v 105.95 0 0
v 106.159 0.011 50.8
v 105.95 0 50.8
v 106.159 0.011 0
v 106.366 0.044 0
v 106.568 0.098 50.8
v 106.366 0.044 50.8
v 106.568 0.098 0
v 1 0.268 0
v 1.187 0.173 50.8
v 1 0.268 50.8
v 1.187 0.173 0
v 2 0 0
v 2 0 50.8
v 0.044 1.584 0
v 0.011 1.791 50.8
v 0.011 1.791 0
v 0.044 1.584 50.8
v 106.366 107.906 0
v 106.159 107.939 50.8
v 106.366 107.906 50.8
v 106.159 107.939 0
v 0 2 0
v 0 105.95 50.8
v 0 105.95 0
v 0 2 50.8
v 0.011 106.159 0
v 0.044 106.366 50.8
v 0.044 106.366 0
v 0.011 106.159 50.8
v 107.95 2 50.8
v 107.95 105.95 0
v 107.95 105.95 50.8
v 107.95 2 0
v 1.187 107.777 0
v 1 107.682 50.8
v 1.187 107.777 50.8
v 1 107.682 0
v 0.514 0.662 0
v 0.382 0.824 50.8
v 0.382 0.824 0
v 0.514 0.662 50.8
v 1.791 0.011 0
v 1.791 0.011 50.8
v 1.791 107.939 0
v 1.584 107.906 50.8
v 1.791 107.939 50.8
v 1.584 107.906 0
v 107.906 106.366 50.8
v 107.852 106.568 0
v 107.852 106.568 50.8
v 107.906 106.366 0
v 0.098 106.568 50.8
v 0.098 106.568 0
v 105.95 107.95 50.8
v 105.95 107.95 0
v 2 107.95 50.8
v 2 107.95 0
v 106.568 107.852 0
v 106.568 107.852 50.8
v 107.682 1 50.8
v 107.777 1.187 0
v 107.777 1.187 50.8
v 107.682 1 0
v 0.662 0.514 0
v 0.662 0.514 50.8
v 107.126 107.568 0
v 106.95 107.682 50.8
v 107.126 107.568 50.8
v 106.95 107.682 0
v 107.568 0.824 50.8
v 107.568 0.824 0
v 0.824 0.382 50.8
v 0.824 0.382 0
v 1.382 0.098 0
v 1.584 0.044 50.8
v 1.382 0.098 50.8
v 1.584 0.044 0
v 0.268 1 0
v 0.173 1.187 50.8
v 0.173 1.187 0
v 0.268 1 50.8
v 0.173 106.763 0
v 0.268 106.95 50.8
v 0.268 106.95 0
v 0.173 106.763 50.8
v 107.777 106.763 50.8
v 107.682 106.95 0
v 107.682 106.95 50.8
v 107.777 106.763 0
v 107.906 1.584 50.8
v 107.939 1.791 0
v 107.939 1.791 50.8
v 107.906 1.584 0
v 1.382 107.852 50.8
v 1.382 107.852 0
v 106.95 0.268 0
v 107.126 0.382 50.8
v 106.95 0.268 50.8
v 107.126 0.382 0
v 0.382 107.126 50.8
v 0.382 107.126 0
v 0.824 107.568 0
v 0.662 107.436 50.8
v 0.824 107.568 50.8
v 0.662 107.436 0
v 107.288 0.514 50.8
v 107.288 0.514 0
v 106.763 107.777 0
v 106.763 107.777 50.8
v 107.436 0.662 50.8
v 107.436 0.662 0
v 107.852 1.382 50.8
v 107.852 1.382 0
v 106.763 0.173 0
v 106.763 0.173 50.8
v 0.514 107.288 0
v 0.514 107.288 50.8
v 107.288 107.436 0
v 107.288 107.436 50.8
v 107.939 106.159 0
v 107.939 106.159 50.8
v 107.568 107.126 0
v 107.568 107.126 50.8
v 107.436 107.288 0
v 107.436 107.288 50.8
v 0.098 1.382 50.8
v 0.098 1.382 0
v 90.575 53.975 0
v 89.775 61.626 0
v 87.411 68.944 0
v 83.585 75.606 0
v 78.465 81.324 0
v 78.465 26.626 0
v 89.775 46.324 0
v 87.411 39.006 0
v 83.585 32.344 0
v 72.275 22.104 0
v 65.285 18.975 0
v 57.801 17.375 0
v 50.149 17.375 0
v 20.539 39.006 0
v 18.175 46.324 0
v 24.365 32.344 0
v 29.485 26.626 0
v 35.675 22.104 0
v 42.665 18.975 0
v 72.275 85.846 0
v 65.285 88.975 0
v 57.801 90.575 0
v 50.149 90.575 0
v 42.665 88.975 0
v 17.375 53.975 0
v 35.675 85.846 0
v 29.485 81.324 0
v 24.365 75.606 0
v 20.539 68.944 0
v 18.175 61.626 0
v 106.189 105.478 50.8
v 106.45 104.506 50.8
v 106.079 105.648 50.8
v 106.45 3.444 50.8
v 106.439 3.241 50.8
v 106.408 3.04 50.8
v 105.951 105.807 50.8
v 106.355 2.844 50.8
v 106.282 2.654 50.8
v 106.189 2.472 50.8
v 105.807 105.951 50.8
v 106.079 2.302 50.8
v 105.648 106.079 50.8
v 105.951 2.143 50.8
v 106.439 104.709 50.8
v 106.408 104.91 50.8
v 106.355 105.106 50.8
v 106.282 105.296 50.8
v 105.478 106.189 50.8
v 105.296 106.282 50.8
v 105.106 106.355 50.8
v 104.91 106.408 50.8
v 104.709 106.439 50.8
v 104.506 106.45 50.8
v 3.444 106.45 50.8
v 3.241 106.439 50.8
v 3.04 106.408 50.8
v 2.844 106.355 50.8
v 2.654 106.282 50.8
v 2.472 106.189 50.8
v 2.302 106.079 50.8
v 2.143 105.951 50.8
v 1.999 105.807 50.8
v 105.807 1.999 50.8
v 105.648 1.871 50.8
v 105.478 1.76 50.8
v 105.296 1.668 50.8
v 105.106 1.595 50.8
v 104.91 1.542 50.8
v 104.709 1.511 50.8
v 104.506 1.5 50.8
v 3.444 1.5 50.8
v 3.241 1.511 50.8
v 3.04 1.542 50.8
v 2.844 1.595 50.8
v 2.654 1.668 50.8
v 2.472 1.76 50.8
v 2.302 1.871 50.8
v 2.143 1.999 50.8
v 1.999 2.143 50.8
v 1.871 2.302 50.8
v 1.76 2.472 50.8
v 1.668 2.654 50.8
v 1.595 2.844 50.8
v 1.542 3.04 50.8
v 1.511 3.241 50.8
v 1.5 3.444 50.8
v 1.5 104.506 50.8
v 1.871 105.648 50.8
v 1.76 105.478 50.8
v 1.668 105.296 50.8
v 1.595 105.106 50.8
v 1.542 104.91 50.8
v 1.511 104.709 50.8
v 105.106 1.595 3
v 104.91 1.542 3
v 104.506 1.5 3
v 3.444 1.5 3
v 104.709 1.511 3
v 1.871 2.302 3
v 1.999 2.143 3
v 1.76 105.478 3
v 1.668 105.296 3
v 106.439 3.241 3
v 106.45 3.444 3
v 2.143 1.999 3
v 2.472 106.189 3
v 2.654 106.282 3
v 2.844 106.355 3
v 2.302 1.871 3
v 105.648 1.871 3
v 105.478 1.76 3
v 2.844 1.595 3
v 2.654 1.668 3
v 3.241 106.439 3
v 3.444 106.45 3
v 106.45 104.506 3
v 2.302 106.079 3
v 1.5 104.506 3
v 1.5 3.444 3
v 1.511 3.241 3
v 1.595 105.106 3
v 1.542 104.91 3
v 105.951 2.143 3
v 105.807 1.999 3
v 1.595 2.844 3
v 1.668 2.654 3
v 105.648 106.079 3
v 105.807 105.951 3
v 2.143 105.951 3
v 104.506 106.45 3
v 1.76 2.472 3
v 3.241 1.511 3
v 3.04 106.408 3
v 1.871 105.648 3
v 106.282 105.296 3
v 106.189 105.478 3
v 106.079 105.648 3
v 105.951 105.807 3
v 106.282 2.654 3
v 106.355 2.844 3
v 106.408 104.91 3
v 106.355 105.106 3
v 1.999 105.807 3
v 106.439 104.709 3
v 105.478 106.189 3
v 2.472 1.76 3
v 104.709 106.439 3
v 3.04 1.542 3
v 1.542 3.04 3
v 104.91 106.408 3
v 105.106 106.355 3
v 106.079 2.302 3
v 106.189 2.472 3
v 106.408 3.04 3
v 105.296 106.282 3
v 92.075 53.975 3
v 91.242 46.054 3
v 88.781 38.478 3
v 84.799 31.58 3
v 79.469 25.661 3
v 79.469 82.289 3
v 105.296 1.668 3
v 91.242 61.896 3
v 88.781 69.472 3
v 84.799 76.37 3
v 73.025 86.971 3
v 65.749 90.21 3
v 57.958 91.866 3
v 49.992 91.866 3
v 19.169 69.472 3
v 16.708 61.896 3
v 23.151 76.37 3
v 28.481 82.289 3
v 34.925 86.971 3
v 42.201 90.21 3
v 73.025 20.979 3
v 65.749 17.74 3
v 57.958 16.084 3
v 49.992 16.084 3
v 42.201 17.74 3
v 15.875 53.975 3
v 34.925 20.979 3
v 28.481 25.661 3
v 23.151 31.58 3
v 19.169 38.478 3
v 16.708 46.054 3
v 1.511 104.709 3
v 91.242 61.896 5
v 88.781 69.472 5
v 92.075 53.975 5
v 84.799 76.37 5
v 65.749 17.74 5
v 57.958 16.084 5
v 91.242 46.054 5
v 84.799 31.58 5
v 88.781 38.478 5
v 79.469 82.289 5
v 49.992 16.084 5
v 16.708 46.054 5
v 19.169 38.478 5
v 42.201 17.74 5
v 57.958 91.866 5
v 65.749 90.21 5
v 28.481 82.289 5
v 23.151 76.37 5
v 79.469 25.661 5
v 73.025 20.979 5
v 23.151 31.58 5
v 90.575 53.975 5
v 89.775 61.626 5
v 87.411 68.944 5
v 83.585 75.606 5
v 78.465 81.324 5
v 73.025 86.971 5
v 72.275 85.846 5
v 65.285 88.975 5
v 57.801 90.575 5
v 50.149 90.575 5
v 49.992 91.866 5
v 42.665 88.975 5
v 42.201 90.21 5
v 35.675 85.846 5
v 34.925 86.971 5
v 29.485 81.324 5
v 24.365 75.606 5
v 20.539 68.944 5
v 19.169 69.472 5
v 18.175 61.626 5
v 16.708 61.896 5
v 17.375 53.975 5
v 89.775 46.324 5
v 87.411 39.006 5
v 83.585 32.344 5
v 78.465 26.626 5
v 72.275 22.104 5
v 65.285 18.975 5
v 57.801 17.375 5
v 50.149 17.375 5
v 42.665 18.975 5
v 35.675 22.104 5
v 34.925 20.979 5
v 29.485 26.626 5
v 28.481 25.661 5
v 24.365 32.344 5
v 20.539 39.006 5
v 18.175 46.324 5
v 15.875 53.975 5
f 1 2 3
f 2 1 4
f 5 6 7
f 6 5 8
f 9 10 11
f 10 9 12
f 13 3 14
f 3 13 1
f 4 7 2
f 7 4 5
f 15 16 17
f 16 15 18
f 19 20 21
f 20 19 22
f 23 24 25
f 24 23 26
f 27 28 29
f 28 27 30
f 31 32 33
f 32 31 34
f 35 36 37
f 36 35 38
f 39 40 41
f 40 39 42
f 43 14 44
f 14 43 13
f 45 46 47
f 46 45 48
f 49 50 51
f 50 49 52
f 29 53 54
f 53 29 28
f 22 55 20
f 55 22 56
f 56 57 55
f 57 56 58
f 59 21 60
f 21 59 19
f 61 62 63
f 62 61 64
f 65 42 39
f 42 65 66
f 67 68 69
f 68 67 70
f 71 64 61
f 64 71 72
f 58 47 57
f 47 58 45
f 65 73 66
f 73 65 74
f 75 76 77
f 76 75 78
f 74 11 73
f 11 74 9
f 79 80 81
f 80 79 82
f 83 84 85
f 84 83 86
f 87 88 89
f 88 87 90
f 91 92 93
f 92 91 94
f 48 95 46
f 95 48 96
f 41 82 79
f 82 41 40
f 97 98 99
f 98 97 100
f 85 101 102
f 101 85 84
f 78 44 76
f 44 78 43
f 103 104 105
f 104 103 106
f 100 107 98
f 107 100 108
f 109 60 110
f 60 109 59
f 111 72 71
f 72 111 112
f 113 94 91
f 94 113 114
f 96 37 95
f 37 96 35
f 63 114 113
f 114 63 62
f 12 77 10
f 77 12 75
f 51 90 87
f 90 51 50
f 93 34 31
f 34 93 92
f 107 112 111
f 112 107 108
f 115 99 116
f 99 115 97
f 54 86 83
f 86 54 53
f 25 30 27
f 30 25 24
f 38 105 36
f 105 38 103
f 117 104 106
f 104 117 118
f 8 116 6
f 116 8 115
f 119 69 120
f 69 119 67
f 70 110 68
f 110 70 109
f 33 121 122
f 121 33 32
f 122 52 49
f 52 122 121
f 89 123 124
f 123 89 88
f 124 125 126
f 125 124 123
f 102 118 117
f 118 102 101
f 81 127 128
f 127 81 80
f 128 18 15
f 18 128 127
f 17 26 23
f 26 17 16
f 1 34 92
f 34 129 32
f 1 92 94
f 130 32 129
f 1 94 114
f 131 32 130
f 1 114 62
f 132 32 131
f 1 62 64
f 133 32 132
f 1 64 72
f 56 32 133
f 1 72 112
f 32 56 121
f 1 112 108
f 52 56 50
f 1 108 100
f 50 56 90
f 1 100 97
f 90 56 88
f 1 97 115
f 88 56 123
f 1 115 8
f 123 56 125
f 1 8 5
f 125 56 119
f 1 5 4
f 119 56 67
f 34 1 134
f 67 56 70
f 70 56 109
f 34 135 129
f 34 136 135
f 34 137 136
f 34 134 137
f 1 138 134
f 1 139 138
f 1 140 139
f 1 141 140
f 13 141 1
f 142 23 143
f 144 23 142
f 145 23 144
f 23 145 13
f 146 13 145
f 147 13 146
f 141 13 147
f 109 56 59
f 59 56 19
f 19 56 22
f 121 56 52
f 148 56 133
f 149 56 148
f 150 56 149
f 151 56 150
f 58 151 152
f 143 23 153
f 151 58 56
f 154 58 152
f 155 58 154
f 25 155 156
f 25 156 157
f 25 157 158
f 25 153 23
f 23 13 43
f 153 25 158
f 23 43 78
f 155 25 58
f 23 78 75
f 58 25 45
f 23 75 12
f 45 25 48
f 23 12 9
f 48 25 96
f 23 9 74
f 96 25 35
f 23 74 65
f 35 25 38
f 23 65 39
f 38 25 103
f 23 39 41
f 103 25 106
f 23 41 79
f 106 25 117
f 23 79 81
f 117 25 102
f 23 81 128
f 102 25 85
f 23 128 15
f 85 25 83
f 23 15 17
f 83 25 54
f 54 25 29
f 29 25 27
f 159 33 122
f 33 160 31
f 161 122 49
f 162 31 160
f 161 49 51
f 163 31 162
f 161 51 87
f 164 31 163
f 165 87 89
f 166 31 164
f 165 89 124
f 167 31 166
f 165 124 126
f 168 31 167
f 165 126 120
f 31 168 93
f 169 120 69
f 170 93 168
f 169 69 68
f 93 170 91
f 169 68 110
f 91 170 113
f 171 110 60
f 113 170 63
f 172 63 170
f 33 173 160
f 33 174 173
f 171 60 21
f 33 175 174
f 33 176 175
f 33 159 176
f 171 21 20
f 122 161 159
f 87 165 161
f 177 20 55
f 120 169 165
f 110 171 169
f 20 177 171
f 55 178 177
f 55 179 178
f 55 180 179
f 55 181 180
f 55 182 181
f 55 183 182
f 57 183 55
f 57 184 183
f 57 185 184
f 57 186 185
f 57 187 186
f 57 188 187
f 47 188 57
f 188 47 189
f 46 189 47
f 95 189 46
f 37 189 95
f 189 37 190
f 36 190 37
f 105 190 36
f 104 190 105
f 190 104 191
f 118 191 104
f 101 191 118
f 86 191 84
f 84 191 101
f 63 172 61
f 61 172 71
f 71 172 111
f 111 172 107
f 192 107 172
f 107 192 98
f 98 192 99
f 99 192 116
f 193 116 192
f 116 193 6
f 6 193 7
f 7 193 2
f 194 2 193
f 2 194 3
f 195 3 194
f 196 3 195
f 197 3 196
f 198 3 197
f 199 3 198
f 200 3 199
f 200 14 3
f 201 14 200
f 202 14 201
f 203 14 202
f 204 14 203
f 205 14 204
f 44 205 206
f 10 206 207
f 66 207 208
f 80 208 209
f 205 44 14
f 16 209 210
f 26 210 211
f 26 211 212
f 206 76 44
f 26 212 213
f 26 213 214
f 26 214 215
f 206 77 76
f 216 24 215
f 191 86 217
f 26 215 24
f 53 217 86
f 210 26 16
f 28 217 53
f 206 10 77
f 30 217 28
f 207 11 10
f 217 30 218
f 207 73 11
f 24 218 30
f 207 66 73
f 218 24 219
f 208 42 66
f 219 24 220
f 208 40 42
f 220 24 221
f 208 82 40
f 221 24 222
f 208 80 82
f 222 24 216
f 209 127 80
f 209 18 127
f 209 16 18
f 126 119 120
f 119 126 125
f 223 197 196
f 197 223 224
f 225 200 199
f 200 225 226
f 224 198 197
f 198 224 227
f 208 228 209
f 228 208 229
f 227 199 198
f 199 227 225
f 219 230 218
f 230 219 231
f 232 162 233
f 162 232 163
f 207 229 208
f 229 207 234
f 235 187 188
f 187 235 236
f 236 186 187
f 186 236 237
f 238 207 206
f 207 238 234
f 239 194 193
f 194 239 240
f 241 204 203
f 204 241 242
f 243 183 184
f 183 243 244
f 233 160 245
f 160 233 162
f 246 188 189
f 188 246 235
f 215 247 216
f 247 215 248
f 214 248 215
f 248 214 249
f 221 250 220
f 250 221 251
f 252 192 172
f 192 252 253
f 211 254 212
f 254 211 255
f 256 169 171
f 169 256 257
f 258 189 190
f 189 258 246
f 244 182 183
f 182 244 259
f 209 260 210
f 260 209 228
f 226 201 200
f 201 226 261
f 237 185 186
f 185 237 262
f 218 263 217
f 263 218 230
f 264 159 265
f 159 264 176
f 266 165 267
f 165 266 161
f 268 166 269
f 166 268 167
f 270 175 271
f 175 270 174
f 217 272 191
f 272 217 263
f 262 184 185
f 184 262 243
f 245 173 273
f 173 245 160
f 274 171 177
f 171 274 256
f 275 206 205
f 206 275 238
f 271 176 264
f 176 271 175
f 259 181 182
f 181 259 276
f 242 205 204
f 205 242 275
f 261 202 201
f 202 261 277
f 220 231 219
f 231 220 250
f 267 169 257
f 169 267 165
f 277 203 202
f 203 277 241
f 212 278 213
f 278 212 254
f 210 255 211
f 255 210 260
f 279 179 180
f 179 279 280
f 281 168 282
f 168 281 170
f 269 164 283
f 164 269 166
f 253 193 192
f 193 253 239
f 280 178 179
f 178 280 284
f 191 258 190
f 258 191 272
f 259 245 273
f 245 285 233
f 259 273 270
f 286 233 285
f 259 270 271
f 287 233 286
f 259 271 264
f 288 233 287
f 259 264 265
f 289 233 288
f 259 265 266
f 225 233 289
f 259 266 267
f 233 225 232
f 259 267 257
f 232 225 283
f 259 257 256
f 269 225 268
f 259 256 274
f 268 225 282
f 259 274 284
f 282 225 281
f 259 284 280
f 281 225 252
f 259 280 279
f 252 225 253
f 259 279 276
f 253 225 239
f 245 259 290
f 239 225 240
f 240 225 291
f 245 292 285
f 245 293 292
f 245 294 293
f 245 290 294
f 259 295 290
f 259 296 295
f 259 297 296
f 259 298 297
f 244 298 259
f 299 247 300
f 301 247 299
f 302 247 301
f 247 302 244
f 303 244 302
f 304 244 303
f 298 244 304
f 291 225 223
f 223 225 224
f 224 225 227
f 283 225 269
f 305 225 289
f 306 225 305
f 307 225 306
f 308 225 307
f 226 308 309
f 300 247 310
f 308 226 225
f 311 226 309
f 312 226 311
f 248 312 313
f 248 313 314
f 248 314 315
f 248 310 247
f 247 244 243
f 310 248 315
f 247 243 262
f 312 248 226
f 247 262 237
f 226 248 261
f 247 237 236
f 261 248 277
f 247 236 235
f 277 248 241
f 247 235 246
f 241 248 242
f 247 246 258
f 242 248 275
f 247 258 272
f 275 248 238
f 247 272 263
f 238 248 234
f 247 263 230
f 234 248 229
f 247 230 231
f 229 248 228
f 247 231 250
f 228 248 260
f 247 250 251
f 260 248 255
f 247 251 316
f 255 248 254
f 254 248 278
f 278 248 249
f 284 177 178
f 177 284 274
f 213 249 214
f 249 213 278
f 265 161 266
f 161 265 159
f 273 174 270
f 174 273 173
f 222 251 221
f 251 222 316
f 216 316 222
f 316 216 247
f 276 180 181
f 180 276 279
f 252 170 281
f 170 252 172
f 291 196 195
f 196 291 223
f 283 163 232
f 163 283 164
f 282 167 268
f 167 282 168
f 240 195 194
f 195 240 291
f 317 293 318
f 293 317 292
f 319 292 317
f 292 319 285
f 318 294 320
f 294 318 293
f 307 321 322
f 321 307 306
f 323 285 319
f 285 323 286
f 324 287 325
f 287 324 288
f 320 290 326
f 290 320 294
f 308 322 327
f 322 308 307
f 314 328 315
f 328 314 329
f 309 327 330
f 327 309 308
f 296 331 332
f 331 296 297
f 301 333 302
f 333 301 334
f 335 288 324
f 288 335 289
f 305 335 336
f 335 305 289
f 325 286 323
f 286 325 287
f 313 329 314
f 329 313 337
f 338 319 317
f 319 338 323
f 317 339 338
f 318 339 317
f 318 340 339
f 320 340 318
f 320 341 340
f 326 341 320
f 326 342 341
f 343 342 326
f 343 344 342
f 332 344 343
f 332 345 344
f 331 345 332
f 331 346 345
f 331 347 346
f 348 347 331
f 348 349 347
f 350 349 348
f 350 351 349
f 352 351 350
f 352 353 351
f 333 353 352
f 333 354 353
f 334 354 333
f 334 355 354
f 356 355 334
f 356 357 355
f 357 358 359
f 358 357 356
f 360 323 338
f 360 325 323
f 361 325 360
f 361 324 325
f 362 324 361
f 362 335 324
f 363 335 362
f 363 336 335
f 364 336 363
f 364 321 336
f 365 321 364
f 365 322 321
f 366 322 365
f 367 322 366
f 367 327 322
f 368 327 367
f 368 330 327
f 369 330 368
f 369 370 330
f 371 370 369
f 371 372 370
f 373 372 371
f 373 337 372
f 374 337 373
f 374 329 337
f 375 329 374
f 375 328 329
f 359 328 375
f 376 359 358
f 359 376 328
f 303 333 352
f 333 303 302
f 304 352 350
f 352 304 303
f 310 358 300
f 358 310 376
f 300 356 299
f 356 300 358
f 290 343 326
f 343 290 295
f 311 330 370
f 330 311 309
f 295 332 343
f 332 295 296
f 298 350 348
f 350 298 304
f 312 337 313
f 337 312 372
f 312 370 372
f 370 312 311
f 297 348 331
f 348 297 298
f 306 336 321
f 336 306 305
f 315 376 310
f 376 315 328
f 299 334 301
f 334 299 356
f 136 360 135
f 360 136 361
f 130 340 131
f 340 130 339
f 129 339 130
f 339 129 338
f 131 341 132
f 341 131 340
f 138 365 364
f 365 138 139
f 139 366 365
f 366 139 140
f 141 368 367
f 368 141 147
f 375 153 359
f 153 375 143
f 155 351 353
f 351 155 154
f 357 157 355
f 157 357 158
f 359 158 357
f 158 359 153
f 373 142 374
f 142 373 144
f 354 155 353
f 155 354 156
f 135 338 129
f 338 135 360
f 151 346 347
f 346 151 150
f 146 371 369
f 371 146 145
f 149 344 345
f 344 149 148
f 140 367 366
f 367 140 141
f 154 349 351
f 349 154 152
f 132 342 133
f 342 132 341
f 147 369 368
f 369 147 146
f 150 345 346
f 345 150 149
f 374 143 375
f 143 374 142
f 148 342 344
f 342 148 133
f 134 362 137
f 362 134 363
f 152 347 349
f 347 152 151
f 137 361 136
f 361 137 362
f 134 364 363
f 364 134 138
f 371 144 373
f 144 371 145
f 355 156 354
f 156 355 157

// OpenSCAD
outside_width = 4.25*25.4;
wall_thickness = 1.5;
outside_height=2*25.4;
drain_height=5;
drain_diameter=3*25.4;
inside_scale = (outside_width-wall_thickness*2)/outside_width;

margin=0.1;

difference() {
    union(){
        //drain exterior
        translate([outside_width*.5, outside_width*.5])
        cylinder(drain_height, r=drain_diameter/2);

        difference() { //holding box
        rounded_rect(outside_width, outside_width, outside_height, 2);
        translate([wall_thickness, wall_thickness, wall_thickness*2]) 
            scale([inside_scale, inside_scale, inside_scale]) 
                rounded_rect(outside_width, outside_width, outside_height, 2);
        }
    }
    //drain hollow
    translate([outside_width*.5, outside_width*.5, -margin])
    resize([drain_diameter-wall_thickness*2, drain_diameter-wall_thickness*2, drain_height+margin*2])
    cylinder(drain_height, r=drain_diameter/2);
}
module rounded_rect(l, w, h, r)
{
    linear_extrude(h)
    translate([r, r, 0])
    offset(r=r, $fn = 60) 
    square([l-(2*r), w-(2*r)]);
}
